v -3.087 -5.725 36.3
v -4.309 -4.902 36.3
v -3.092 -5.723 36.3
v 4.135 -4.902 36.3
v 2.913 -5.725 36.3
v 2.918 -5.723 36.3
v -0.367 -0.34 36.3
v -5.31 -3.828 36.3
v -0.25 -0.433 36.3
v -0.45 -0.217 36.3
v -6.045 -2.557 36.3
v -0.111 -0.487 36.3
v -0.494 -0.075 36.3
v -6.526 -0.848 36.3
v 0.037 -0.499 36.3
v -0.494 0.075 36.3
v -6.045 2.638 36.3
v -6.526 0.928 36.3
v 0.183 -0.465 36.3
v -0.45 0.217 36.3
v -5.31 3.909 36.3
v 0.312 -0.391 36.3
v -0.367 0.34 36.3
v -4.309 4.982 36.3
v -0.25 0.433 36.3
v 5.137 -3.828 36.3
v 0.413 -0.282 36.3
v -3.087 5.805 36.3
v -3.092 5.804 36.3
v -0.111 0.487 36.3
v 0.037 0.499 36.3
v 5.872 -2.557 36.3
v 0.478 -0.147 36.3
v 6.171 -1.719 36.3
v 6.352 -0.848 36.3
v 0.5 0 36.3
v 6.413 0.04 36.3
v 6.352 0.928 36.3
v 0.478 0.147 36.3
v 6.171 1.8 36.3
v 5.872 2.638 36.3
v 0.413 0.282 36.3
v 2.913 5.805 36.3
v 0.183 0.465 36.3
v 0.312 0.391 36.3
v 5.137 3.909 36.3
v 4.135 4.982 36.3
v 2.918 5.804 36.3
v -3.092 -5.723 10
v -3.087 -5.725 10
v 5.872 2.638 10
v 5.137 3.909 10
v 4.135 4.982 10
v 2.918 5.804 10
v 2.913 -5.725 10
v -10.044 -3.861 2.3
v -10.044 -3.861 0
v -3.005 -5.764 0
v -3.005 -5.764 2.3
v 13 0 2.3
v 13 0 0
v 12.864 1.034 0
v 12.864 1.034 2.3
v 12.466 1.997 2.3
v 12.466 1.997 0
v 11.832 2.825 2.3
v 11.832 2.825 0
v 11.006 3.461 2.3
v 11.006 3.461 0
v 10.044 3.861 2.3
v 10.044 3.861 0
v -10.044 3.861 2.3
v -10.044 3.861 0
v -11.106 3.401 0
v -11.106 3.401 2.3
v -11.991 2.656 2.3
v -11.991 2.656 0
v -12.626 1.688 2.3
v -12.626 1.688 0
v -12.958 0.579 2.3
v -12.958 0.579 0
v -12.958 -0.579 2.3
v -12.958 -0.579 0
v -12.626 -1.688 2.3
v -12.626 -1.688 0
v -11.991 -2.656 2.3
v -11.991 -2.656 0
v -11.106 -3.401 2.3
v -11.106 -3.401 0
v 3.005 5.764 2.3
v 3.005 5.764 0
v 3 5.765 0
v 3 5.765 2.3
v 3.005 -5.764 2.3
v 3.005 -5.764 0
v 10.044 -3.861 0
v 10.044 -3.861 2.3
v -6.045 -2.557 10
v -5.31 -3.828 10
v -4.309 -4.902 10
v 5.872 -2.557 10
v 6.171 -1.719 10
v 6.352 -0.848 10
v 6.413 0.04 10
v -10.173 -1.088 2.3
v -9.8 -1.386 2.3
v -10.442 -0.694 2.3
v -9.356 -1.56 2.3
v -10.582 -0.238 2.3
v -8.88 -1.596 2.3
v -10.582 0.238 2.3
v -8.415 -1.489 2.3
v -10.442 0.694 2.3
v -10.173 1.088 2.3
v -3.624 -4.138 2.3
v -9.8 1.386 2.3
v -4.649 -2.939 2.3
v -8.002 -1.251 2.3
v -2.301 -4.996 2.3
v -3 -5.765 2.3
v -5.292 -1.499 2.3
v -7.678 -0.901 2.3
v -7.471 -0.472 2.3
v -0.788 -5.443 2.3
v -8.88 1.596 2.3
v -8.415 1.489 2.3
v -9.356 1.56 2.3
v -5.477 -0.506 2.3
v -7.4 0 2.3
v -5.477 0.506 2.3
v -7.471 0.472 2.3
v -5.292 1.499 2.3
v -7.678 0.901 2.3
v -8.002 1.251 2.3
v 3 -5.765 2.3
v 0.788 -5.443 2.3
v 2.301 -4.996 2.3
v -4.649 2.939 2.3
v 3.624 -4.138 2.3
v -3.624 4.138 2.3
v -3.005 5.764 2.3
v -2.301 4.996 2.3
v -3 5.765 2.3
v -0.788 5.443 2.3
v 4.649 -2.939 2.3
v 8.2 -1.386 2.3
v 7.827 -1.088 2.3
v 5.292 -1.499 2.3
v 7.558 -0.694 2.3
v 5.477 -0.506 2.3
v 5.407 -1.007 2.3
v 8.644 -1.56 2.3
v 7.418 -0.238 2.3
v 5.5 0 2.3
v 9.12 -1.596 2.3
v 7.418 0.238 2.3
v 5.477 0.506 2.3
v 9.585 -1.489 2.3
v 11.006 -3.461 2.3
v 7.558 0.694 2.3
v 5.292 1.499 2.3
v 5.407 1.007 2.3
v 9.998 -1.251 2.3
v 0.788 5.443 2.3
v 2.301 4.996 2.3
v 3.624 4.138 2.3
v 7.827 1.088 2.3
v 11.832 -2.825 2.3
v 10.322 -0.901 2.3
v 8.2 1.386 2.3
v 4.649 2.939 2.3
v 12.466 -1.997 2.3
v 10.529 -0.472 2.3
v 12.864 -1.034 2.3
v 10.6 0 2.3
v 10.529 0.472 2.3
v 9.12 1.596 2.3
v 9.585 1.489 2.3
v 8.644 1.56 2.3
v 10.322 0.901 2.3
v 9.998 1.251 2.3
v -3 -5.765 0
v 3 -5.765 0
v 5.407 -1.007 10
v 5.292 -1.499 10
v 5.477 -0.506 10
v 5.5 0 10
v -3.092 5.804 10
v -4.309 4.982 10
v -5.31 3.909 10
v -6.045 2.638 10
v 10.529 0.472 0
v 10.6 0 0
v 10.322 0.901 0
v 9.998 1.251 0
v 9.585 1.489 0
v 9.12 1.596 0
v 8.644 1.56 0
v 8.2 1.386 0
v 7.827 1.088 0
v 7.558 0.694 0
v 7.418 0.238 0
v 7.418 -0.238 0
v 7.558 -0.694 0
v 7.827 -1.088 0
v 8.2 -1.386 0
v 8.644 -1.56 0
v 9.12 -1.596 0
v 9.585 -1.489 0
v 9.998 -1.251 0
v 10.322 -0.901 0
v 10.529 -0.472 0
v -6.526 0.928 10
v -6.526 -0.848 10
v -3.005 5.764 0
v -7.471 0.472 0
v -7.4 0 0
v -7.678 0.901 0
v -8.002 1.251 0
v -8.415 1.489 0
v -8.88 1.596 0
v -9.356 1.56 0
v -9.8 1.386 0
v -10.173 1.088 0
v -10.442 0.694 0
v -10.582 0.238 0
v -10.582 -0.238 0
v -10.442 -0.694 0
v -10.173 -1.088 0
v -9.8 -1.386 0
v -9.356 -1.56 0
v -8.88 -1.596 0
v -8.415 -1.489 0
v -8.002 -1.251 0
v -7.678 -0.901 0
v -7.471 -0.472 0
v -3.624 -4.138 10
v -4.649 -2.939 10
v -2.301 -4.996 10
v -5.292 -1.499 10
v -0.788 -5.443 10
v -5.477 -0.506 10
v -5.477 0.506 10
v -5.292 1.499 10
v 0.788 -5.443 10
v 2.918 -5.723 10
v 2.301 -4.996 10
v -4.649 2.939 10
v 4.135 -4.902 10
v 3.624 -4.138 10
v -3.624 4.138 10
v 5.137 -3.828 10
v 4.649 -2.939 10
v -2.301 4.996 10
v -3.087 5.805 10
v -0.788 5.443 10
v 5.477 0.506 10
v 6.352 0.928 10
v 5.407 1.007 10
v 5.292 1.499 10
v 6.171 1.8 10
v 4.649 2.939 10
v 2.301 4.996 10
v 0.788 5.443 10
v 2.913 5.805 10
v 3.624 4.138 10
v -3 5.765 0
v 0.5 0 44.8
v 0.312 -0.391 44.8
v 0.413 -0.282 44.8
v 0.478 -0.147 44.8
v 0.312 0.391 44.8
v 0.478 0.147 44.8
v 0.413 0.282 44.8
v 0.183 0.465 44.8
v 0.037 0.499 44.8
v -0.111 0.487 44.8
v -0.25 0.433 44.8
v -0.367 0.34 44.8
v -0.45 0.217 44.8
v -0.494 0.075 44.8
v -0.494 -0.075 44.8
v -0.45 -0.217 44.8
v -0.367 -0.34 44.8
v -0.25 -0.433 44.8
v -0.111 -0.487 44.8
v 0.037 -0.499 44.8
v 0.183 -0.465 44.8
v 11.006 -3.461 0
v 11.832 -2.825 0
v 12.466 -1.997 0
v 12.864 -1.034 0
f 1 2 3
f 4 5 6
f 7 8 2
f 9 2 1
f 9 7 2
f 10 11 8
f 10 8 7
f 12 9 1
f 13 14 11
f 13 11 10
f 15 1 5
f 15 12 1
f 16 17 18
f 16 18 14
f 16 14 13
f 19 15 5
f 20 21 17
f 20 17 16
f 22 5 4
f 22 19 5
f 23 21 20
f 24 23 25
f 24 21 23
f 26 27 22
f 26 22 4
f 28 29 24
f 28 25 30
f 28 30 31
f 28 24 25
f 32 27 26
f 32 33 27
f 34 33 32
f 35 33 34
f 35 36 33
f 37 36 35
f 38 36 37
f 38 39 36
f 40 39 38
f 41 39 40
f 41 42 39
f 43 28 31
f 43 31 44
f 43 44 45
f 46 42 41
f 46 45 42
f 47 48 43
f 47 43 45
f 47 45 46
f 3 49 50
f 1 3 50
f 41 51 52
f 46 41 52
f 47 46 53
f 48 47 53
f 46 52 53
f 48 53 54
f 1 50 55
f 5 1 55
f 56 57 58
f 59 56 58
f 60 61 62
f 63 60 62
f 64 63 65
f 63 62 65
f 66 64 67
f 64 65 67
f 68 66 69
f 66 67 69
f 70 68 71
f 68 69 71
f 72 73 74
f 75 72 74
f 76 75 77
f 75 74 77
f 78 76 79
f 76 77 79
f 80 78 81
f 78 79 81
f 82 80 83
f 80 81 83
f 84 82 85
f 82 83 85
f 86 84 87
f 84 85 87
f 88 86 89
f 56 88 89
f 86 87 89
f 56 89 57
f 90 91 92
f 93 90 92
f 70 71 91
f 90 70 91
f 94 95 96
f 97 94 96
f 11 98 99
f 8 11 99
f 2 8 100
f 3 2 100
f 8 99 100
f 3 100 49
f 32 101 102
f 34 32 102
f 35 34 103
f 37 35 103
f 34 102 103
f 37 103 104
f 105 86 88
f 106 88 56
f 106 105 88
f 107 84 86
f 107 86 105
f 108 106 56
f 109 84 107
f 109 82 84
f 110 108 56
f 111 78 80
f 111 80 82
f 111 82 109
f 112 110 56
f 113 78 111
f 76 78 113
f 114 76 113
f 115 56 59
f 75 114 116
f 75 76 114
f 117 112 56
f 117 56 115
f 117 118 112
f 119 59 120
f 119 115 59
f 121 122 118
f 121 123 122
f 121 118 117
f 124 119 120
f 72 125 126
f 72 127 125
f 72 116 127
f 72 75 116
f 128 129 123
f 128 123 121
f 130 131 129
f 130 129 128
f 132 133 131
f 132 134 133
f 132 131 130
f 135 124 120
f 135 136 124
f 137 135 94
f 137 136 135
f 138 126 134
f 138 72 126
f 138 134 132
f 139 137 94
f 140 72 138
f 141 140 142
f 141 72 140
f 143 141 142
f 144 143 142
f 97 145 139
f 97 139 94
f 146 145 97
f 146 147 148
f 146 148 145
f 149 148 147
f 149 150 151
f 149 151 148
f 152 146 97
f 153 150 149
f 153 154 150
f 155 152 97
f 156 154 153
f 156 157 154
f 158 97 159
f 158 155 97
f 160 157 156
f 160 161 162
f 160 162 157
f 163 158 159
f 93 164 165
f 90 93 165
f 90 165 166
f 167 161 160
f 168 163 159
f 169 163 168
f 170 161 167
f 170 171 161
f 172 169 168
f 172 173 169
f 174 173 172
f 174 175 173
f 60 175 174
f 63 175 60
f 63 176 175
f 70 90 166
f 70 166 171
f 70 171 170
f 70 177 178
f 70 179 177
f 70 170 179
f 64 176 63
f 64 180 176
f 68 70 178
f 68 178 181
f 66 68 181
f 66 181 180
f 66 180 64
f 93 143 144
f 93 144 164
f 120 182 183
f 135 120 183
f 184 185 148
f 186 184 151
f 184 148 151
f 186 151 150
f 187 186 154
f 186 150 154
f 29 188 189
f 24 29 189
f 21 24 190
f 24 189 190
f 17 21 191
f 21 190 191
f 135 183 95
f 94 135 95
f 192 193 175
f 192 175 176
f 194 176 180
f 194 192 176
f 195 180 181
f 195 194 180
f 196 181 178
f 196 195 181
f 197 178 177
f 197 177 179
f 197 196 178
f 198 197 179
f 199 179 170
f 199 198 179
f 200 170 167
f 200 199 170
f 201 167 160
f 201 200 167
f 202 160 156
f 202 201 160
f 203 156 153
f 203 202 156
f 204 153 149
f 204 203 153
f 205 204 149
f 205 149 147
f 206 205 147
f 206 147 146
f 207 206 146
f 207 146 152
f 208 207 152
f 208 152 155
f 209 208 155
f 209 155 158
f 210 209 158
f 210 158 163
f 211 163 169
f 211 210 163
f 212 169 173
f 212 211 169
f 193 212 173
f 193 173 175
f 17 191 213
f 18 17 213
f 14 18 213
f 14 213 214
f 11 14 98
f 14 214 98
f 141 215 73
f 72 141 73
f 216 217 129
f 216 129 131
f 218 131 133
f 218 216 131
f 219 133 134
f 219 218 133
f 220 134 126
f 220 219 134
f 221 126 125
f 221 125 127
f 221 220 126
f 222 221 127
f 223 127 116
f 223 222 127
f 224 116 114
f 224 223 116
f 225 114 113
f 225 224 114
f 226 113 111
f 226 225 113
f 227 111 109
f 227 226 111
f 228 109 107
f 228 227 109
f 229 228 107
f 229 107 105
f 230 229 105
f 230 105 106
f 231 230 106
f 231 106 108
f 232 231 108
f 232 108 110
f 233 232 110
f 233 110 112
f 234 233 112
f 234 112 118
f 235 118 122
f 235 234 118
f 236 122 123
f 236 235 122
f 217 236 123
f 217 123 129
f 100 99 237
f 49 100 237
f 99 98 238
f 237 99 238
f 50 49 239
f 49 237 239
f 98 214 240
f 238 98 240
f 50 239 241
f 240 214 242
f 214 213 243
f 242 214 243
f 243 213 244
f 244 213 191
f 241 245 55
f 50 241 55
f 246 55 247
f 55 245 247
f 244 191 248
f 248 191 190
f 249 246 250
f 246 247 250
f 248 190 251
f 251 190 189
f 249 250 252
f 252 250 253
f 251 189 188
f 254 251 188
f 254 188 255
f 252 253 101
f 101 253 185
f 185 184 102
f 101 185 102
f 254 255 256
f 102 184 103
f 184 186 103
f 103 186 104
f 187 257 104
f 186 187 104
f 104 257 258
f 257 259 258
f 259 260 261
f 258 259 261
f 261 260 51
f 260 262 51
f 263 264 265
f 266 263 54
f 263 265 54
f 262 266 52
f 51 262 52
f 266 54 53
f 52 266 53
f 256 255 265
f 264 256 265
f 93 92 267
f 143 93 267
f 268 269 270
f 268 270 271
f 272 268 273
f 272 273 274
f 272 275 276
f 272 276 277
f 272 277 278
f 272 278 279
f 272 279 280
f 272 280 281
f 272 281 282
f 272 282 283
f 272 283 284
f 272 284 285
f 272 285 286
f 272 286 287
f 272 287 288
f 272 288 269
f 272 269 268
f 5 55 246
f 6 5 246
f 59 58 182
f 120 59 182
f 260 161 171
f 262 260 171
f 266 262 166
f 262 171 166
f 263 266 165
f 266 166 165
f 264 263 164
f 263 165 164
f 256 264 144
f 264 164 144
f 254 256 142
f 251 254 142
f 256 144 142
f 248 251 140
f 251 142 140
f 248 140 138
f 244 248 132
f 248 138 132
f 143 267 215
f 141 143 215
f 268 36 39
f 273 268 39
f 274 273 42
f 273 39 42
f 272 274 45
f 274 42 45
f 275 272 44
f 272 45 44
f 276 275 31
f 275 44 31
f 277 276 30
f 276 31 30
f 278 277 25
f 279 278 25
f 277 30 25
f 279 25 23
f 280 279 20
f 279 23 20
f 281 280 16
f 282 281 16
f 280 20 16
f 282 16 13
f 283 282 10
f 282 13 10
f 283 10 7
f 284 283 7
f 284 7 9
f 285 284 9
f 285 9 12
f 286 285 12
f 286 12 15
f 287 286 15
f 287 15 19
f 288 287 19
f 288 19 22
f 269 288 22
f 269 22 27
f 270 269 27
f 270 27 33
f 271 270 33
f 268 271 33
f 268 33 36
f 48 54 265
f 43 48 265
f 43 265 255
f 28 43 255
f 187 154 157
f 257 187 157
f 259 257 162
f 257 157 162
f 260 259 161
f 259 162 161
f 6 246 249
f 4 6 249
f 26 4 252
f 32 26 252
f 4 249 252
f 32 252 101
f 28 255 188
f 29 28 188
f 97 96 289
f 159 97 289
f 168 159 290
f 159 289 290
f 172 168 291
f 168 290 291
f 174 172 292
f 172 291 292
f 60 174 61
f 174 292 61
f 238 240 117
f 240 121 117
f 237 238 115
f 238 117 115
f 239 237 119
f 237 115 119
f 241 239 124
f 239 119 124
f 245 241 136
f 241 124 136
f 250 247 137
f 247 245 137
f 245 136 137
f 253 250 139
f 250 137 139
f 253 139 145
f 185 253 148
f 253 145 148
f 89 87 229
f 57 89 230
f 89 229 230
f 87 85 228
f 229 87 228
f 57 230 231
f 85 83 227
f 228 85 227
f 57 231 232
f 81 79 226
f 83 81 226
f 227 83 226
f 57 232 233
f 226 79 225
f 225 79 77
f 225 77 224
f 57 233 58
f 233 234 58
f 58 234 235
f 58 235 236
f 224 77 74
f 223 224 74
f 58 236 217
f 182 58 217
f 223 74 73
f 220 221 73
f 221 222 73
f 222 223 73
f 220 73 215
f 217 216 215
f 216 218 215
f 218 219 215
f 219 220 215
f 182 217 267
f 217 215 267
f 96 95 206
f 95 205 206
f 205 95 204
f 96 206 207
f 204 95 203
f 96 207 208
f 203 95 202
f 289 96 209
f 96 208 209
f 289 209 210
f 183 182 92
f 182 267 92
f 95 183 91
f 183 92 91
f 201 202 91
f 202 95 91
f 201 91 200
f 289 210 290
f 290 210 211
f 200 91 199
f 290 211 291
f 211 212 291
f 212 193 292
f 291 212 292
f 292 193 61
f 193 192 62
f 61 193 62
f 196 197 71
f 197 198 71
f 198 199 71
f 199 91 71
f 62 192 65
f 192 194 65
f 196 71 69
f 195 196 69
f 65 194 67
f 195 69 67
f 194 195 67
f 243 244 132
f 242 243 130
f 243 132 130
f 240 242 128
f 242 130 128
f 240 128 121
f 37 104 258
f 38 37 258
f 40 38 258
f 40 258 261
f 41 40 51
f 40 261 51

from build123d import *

# Parameters (mm, degrees)
F0_R     = 1.6
F0_R_2   = 0.5
F1_DEPTH = 2.3
F2_DEPTH = 10
F3_R     = 0.5
F4_DEPTH = 26.3
F5_DEPTH = 44.8
F6_R     = 0.5
F7_DEPTH = 2.5


with BuildPart() as f1:
    # F0 (on Top) → F1 (new body)
    with BuildSketch(Plane.XY):
        with BuildLine():
            ThreePointArc((-5.9583333333, 2.5977420751), (-7.8179017385, 3.8213405632), (-10.0435650822, 3.8614727656))
            ThreePointArc((-10.0435650822, 3.8614727656), (-13, 0), (-10.0435650822, -3.8614727656))
            ThreePointArc((-10.0435650822, -3.8614727656), (-7.8179017385, -3.8213405632), (-5.9583333333, -2.5977420751))
            ThreePointArc((-5.9583333333, -2.5977420751), (-6.5, 0), (-5.9583333333, 2.5977420751))
        make_face()
        with Locations((-9, 0)):
            Circle(F0_R, mode=Mode.SUBTRACT)
        with BuildLine():
            ThreePointArc((-5.9583333333, 2.5977420751), (-4.7530555292, 4.4337865461), (-3.0051133447, 5.7636181159))
            Line((-3.0051133447, 5.7636181159), (-10.0435650822, 3.8614727656))
            ThreePointArc((-10.0435650822, 3.8614727656), (-7.8179017385, 3.8213405632), (-5.9583333333, 2.5977420751))
        make_face()
        with BuildLine():
            ThreePointArc((-5.2916666667, -1.4994211846), (-5.5, 0), (-5.2916666667, 1.4994211846))
            ThreePointArc((-5.2916666667, 1.4994211846), (-5.5806137693, 2.0755235015), (-5.9583333333, 2.5977420751))
            ThreePointArc((-5.9583333333, 2.5977420751), (-6.5, 0), (-5.9583333333, -2.5977420751))
            ThreePointArc((-5.9583333333, -2.5977420751), (-5.5806137693, -2.0755235015), (-5.2916666667, -1.4994211846))
        make_face()
        with BuildLine():
            ThreePointArc((-5, 0), (-5.0735936702, 0.7637626158), (-5.2916666667, 1.4994211846))
            ThreePointArc((-5.2916666667, 1.4994211846), (-5.5, 0), (-5.2916666667, -1.4994211846))
            ThreePointArc((-5.2916666667, -1.4994211846), (-5.0735936702, -0.7637626158), (-5, 0))
        make_face()
        with BuildLine():
            Line((-10.0435650822, -3.8614727656), (-3.0051133447, -5.7636181159))
            ThreePointArc((-3.0051133447, -5.7636181159), (-4.7530555292, -4.4337865461), (-5.9583333333, -2.5977420751))
            ThreePointArc((-5.9583333333, -2.5977420751), (-7.8179017385, -3.8213405632), (-10.0435650822, -3.8614727656))
        make_face()
        with BuildLine():
            ThreePointArc((3.0051133447, -5.7636181159), (4.7530555292, -4.4337865461), (5.9583333333, -2.5977420751))
            ThreePointArc((5.9583333333, -2.5977420751), (5.5806137693, -2.0755235015), (5.2916666667, -1.4994211846))
            ThreePointArc((5.2916666667, -1.4994211846), (0, -5.5), (-5.2916666667, -1.4994211846))
            ThreePointArc((-5.2916666667, -1.4994211846), (-5.5806137693, -2.0755235015), (-5.9583333333, -2.5977420751))
            ThreePointArc((-5.9583333333, -2.5977420751), (-4.7530555292, -4.4337865461), (-3.0051133447, -5.7636181159))
            Line((-3.0051133447, -5.7636181159), (-3, -5.765))
            Line((-3, -5.765), (3, -5.765))
            Line((3, -5.765), (3.0051133447, -5.7636181159))
        make_face()
        with BuildLine():
            ThreePointArc((5.2916666667, -1.4994211846), (5, 0), (5.2916666667, 1.4994211846))
            ThreePointArc((5.2916666667, 1.4994211846), (0, 5.5), (-5.2916666667, 1.4994211846))
            ThreePointArc((-5.2916666667, 1.4994211846), (-5.0735936702, 0.7637626158), (-5, 0))
            ThreePointArc((-5, 0), (-5.0735936702, -0.7637626158), (-5.2916666667, -1.4994211846))
            ThreePointArc((-5.2916666667, -1.4994211846), (0, -5.5), (5.2916666667, -1.4994211846))
        make_face()
        Circle(F0_R_2, mode=Mode.SUBTRACT)
        with BuildLine():
            ThreePointArc((5.2916666667, 1.4994211846), (5.5806137693, 2.0755235015), (5.9583333333, 2.5977420751))
            ThreePointArc((5.9583333333, 2.5977420751), (4.7530555292, 4.4337865461), (3.0051133447, 5.7636181159))
            Line((3.0051133447, 5.7636181159), (3, 5.765))
            Line((3, 5.765), (-3, 5.765))
            Line((-3, 5.765), (-3.0051133447, 5.7636181159))
            ThreePointArc((-3.0051133447, 5.7636181159), (-4.7530555292, 4.4337865461), (-5.9583333333, 2.5977420751))
            ThreePointArc((-5.9583333333, 2.5977420751), (-5.5806137693, 2.0755235015), (-5.2916666667, 1.4994211846))
            ThreePointArc((-5.2916666667, 1.4994211846), (0, 5.5), (5.2916666667, 1.4994211846))
        make_face()
        with BuildLine():
            ThreePointArc((5.9583333333, 2.5977420751), (7.8179017385, 3.8213405632), (10.0435650822, 3.8614727656))
            Line((10.0435650822, 3.8614727656), (3.0051133447, 5.7636181159))
            ThreePointArc((3.0051133447, 5.7636181159), (4.7530555292, 4.4337865461), (5.9583333333, 2.5977420751))
        make_face()
        with BuildLine():
            ThreePointArc((5.5, 0), (5.4476676967, 0.7569125885), (5.2916666667, 1.4994211846))
            ThreePointArc((5.2916666667, 1.4994211846), (5, 0), (5.2916666667, -1.4994211846))
            ThreePointArc((5.2916666667, -1.4994211846), (5.4476676967, -0.7569125885), (5.5, 0))
        make_face()
        with BuildLine():
            ThreePointArc((6.5, 0), (6.3631425674, 1.326806944), (5.9583333333, 2.5977420751))
            ThreePointArc((5.9583333333, 2.5977420751), (5.5806137693, 2.0755235015), (5.2916666667, 1.4994211846))
            ThreePointArc((5.2916666667, 1.4994211846), (5.4476676967, 0.7569125885), (5.5, 0))
            ThreePointArc((5.5, 0), (5.4476676967, -0.7569125885), (5.2916666667, -1.4994211846))
            ThreePointArc((5.2916666667, -1.4994211846), (5.5806137693, -2.0755235015), (5.9583333333, -2.5977420751))
            ThreePointArc((5.9583333333, -2.5977420751), (6.3631425674, -1.326806944), (6.5, 0))
        make_face()
        with BuildLine():
            ThreePointArc((10.0435650822, -3.8614727656), (12.1760242701, -2.4316393309), (13, 0))
            ThreePointArc((13, 0), (12.1760242701, 2.4316393309), (10.0435650822, 3.8614727656))
            ThreePointArc((10.0435650822, 3.8614727656), (7.8179017385, 3.8213405632), (5.9583333333, 2.5977420751))
            ThreePointArc((5.9583333333, 2.5977420751), (6.3631425674, 1.326806944), (6.5, 0))
            ThreePointArc((6.5, 0), (6.3631425674, -1.326806944), (5.9583333333, -2.5977420751))
            ThreePointArc((5.9583333333, -2.5977420751), (7.8179017385, -3.8213405632), (10.0435650822, -3.8614727656))
        make_face()
        with Locations((9, 0)):
            Circle(F0_R, mode=Mode.SUBTRACT)
        with BuildLine():
            Line((3.0051133447, -5.7636181159), (10.0435650822, -3.8614727656))
            ThreePointArc((10.0435650822, -3.8614727656), (7.8179017385, -3.8213405632), (5.9583333333, -2.5977420751))
            ThreePointArc((5.9583333333, -2.5977420751), (4.7530555292, -4.4337865461), (3.0051133447, -5.7636181159))
        make_face()
    extrude(amount=F1_DEPTH)

    # F0 (on Top) → F2 (join)
    with BuildSketch(Plane.XY):
        with BuildLine():
            ThreePointArc((5.2916666667, -1.4994211846), (5, 0), (5.2916666667, 1.4994211846))
            ThreePointArc((5.2916666667, 1.4994211846), (0, 5.5), (-5.2916666667, 1.4994211846))
            ThreePointArc((-5.2916666667, 1.4994211846), (-5.0735936702, 0.7637626158), (-5, 0))
            ThreePointArc((-5, 0), (-5.0735936702, -0.7637626158), (-5.2916666667, -1.4994211846))
            ThreePointArc((-5.2916666667, -1.4994211846), (0, -5.5), (5.2916666667, -1.4994211846))
        make_face()
        Circle(F0_R_2, mode=Mode.SUBTRACT)
        Circle(F0_R_2)
        with BuildLine():
            ThreePointArc((-5, 0), (-5.0735936702, 0.7637626158), (-5.2916666667, 1.4994211846))
            ThreePointArc((-5.2916666667, 1.4994211846), (-5.5, 0), (-5.2916666667, -1.4994211846))
            ThreePointArc((-5.2916666667, -1.4994211846), (-5.0735936702, -0.7637626158), (-5, 0))
        make_face()
        with BuildLine():
            ThreePointArc((5.5, 0), (5.4476676967, 0.7569125885), (5.2916666667, 1.4994211846))
            ThreePointArc((5.2916666667, 1.4994211846), (5, 0), (5.2916666667, -1.4994211846))
            ThreePointArc((5.2916666667, -1.4994211846), (5.4476676967, -0.7569125885), (5.5, 0))
        make_face()
    extrude(amount=F2_DEPTH)

    # F3 (on face) → F4 (join)
    with BuildSketch(Plane.XY.offset(10)):
        with BuildLine():
            ThreePointArc((5.2050472789, -1.4591722497), (4.9133806123, 0.040248935), (5.2050472789, 1.5396701196))
            ThreePointArc((5.2050472789, 1.5396701196), (4.1142515453, 3.5902747665), (2.2742683579, 5.0077643152))
            ThreePointArc((2.2742683579, 5.0077643152), (-2.364863611, 4.9656238381), (-5.3213602345, 1.3903687478))
            ThreePointArc((-5.3213602345, 1.3903687478), (-5.1457415279, 0.7254362769), (-5.0866193877, 0.040248935))
            ThreePointArc((-5.0866193877, 0.040248935), (-5.1488151768, -0.662387526), (-5.3334683859, -1.3431734724))
            ThreePointArc((-5.3334683859, -1.3431734724), (-4.2526159756, -3.4878728997), (-2.3608877456, -4.9675153802))
            ThreePointArc((-2.3608877456, -4.9675153802), (2.2270986199, -4.949411272), (5.2050472789, -1.4591722497))
        make_face()
        with Locations((-0.0866193877, 0.040248935)):
            Circle(F3_R, mode=Mode.SUBTRACT)
        with BuildLine():
            ThreePointArc((5.2487200718, 1.6434529528), (5.5235454188, 2.1636936272), (5.8717139456, 2.6379910101))
            ThreePointArc((5.8717139456, 2.6379910101), (4.6664361415, 4.474035481), (2.918493957, 5.8038670508))
            Line((2.918493957, 5.8038670508), (2.9133806123, 5.805248935))
            Line((2.9133806123, 5.805248935), (-3.0866193877, 5.805248935))
            Line((-3.0866193877, 5.805248935), (-3.0917327325, 5.8038670508))
            ThreePointArc((-3.0917327325, 5.8038670508), (-4.839674917, 4.474035481), (-6.0449527211, 2.6379910101))
            ThreePointArc((-6.0449527211, 2.6379910101), (-5.667233157, 2.1157724365), (-5.3782860544, 1.5396701196))
            ThreePointArc((-5.3782860544, 1.5396701196), (-2.3569245673, 5.0498112304), (2.2742683579, 5.0077643152))
            ThreePointArc((2.2742683579, 5.0077643152), (4.1204959002, 3.6430088575), (5.2487200718, 1.6434529528))
        make_face()
        with BuildLine():
            ThreePointArc((2.918493957, -5.7233691809), (4.6664361415, -4.3935376111), (5.8717139456, -2.5574931402))
            ThreePointArc((5.8717139456, -2.5574931402), (5.5331684294, -2.0984809683), (5.2633479593, -1.5959850435))
            ThreePointArc((5.2633479593, -1.5959850435), (2.2243814929, -5.0301219641), (-2.3608877456, -4.9675153802))
            ThreePointArc((-2.3608877456, -4.9675153802), (-4.2565068058, -3.5461195515), (-5.3782860544, -1.4591722497))
            ThreePointArc((-5.3782860544, -1.4591722497), (-5.667233157, -2.0352745666), (-6.0449527211, -2.5574931402))
            ThreePointArc((-6.0449527211, -2.5574931402), (-4.839674917, -4.3935376111), (-3.0917327325, -5.7233691809))
            Line((-3.0917327325, -5.7233691809), (-3.0866193877, -5.724751065))
            Line((-3.0866193877, -5.724751065), (2.9133806123, -5.724751065))
            Line((2.9133806123, -5.724751065), (2.918493957, -5.7233691809))
        make_face()
        with BuildLine():
            ThreePointArc((-5.3782860544, 1.5396701196), (-5.667233157, 2.1157724365), (-6.0449527211, 2.6379910101))
            ThreePointArc((-6.0449527211, 2.6379910101), (-6.5866193877, 0.040248935), (-6.0449527211, -2.5574931402))
            ThreePointArc((-6.0449527211, -2.5574931402), (-5.667233157, -2.0352745666), (-5.3782860544, -1.4591722497))
            ThreePointArc((-5.3782860544, -1.4591722497), (-5.5866193877, 0.040248935), (-5.3782860544, 1.5396701196))
        make_face()
        with BuildLine():
            ThreePointArc((6.4133806123, 0.040248935), (6.2765231797, 1.367055879), (5.8717139456, 2.6379910101))
            ThreePointArc((5.8717139456, 2.6379910101), (5.5235454188, 2.1636936272), (5.2487200718, 1.6434529528))
            ThreePointArc((5.2487200718, 1.6434529528), (5.4368171017, 0.8312760087), (5.5, 0))
            ThreePointArc((5.5, 0), (5.4405153146, -0.806717492), (5.2633479593, -1.5959850435))
            ThreePointArc((5.2633479593, -1.5959850435), (5.5331684294, -2.0984809683), (5.8717139456, -2.5574931402))
            ThreePointArc((5.8717139456, -2.5574931402), (6.2765231797, -1.286558009), (6.4133806123, 0.040248935))
        make_face()
        with BuildLine():
            ThreePointArc((5.4133806123, 0.040248935), (5.3610483089, 0.7971615235), (5.2050472789, 1.5396701196))
            ThreePointArc((5.2050472789, 1.5396701196), (4.9133806123, 0.040248935), (5.2050472789, -1.4591722497))
            ThreePointArc((5.2050472789, -1.4591722497), (5.3610483089, -0.7166636536), (5.4133806123, 0.040248935))
        make_face()
        with Locations((-0.0866193877, 0.040248935)):
            Circle(F3_R)
        with BuildLine():
            ThreePointArc((-5.0866193877, 0.040248935), (-5.1457415279, 0.7254362769), (-5.3213602345, 1.3903687478))
            ThreePointArc((-5.3213602345, 1.3903687478), (-5.4999460452, 0.0243618623), (-5.3334683859, -1.3431734724))
            ThreePointArc((-5.3334683859, -1.3431734724), (-5.1488151768, -0.662387526), (-5.0866193877, 0.040248935))
        make_face()
        with BuildLine():
            ThreePointArc((-5.3213602345, 1.3903687478), (-2.364863611, 4.9656238381), (2.2742683579, 5.0077643152))
            ThreePointArc((2.2742683579, 5.0077643152), (-2.3569245673, 5.0498112304), (-5.3782860544, 1.5396701196))
            ThreePointArc((-5.3782860544, 1.5396701196), (-5.3490775634, 1.4653037098), (-5.3213602345, 1.3903687478))
        make_face()
        with BuildLine():
            ThreePointArc((-2.3608877456, -4.9675153802), (2.2243814929, -5.0301219641), (5.2633479593, -1.5959850435))
            ThreePointArc((5.2633479593, -1.5959850435), (5.2335617401, -1.5278496167), (5.2050472789, -1.4591722497))
            ThreePointArc((5.2050472789, -1.4591722497), (2.2270986199, -4.949411272), (-2.3608877456, -4.9675153802))
        make_face()
        with BuildLine():
            ThreePointArc((5.5, 0), (5.4368171017, 0.8312760087), (5.2487200718, 1.6434529528))
            ThreePointArc((5.2487200718, 1.6434529528), (5.2265184796, 1.591715214), (5.2050472789, 1.5396701196))
            ThreePointArc((5.2050472789, 1.5396701196), (5.3610483089, 0.7971615235), (5.4133806123, 0.040248935))
            ThreePointArc((5.4133806123, 0.040248935), (5.3610483089, -0.7166636536), (5.2050472789, -1.4591722497))
            ThreePointArc((5.2050472789, -1.4591722497), (5.2335617401, -1.5278496167), (5.2633479593, -1.5959850435))
            ThreePointArc((5.2633479593, -1.5959850435), (5.4405153146, -0.806717492), (5.5, 0))
        make_face()
        with BuildLine():
            ThreePointArc((-5.3213602345, 1.3903687478), (-5.3490775634, 1.4653037098), (-5.3782860544, 1.5396701196))
            ThreePointArc((-5.3782860544, 1.5396701196), (-5.5866193877, 0.040248935), (-5.3782860544, -1.4591722497))
            ThreePointArc((-5.3782860544, -1.4591722497), (-5.3554264082, -1.4013470382), (-5.3334683859, -1.3431734724))
            ThreePointArc((-5.3334683859, -1.3431734724), (-5.4999460452, 0.0243618623), (-5.3213602345, 1.3903687478))
        make_face()
        with BuildLine():
            ThreePointArc((-5.3782860544, -1.4591722497), (-4.2565068058, -3.5461195515), (-2.3608877456, -4.9675153802))
            ThreePointArc((-2.3608877456, -4.9675153802), (-4.2526159756, -3.4878728997), (-5.3334683859, -1.3431734724))
            ThreePointArc((-5.3334683859, -1.3431734724), (-5.3554264082, -1.4013470382), (-5.3782860544, -1.4591722497))
        make_face()
        with BuildLine():
            ThreePointArc((5.2050472789, 1.5396701196), (5.2265184796, 1.591715214), (5.2487200718, 1.6434529528))
            ThreePointArc((5.2487200718, 1.6434529528), (4.1204959002, 3.6430088575), (2.2742683579, 5.0077643152))
            ThreePointArc((2.2742683579, 5.0077643152), (4.1142515453, 3.5902747665), (5.2050472789, 1.5396701196))
        make_face()
    extrude(amount=F4_DEPTH)

    # F0 (on Top) → F5 (join)
    with BuildSketch(Plane.XY):
        Circle(F0_R_2)
    extrude(amount=F5_DEPTH)

    # F6 (on face) → F7 (join, symmetric)
    with BuildSketch(Plane.XY.offset(10)):
        with BuildLine():
            ThreePointArc((-2.3608877456, -4.9675153802), (2.2270986199, -4.949411272), (5.2050472789, -1.4591722497))
            ThreePointArc((5.2050472789, -1.4591722497), (4.9133806123, 0.040248935), (5.2050472789, 1.5396701196))
            ThreePointArc((5.2050472789, 1.5396701196), (4.1142515453, 3.5902747665), (2.2742683579, 5.0077643152))
            ThreePointArc((2.2742683579, 5.0077643152), (-2.364863611, 4.9656238381), (-5.3213602345, 1.3903687478))
            ThreePointArc((-5.3213602345, 1.3903687478), (-5.1457415279, 0.7254362769), (-5.0866193877, 0.040248935))
            ThreePointArc((-5.0866193877, 0.040248935), (-5.1488151768, -0.662387526), (-5.3334683859, -1.3431734724))
            ThreePointArc((-5.3334683859, -1.3431734724), (-4.2526159756, -3.4878728997), (-2.3608877456, -4.9675153802))
        make_face()
        with Locations((-0.0866193877, 0.040248935)):
            Circle(F6_R, mode=Mode.SUBTRACT)
    extrude(amount=F7_DEPTH, both=True)


solid = f1.part
